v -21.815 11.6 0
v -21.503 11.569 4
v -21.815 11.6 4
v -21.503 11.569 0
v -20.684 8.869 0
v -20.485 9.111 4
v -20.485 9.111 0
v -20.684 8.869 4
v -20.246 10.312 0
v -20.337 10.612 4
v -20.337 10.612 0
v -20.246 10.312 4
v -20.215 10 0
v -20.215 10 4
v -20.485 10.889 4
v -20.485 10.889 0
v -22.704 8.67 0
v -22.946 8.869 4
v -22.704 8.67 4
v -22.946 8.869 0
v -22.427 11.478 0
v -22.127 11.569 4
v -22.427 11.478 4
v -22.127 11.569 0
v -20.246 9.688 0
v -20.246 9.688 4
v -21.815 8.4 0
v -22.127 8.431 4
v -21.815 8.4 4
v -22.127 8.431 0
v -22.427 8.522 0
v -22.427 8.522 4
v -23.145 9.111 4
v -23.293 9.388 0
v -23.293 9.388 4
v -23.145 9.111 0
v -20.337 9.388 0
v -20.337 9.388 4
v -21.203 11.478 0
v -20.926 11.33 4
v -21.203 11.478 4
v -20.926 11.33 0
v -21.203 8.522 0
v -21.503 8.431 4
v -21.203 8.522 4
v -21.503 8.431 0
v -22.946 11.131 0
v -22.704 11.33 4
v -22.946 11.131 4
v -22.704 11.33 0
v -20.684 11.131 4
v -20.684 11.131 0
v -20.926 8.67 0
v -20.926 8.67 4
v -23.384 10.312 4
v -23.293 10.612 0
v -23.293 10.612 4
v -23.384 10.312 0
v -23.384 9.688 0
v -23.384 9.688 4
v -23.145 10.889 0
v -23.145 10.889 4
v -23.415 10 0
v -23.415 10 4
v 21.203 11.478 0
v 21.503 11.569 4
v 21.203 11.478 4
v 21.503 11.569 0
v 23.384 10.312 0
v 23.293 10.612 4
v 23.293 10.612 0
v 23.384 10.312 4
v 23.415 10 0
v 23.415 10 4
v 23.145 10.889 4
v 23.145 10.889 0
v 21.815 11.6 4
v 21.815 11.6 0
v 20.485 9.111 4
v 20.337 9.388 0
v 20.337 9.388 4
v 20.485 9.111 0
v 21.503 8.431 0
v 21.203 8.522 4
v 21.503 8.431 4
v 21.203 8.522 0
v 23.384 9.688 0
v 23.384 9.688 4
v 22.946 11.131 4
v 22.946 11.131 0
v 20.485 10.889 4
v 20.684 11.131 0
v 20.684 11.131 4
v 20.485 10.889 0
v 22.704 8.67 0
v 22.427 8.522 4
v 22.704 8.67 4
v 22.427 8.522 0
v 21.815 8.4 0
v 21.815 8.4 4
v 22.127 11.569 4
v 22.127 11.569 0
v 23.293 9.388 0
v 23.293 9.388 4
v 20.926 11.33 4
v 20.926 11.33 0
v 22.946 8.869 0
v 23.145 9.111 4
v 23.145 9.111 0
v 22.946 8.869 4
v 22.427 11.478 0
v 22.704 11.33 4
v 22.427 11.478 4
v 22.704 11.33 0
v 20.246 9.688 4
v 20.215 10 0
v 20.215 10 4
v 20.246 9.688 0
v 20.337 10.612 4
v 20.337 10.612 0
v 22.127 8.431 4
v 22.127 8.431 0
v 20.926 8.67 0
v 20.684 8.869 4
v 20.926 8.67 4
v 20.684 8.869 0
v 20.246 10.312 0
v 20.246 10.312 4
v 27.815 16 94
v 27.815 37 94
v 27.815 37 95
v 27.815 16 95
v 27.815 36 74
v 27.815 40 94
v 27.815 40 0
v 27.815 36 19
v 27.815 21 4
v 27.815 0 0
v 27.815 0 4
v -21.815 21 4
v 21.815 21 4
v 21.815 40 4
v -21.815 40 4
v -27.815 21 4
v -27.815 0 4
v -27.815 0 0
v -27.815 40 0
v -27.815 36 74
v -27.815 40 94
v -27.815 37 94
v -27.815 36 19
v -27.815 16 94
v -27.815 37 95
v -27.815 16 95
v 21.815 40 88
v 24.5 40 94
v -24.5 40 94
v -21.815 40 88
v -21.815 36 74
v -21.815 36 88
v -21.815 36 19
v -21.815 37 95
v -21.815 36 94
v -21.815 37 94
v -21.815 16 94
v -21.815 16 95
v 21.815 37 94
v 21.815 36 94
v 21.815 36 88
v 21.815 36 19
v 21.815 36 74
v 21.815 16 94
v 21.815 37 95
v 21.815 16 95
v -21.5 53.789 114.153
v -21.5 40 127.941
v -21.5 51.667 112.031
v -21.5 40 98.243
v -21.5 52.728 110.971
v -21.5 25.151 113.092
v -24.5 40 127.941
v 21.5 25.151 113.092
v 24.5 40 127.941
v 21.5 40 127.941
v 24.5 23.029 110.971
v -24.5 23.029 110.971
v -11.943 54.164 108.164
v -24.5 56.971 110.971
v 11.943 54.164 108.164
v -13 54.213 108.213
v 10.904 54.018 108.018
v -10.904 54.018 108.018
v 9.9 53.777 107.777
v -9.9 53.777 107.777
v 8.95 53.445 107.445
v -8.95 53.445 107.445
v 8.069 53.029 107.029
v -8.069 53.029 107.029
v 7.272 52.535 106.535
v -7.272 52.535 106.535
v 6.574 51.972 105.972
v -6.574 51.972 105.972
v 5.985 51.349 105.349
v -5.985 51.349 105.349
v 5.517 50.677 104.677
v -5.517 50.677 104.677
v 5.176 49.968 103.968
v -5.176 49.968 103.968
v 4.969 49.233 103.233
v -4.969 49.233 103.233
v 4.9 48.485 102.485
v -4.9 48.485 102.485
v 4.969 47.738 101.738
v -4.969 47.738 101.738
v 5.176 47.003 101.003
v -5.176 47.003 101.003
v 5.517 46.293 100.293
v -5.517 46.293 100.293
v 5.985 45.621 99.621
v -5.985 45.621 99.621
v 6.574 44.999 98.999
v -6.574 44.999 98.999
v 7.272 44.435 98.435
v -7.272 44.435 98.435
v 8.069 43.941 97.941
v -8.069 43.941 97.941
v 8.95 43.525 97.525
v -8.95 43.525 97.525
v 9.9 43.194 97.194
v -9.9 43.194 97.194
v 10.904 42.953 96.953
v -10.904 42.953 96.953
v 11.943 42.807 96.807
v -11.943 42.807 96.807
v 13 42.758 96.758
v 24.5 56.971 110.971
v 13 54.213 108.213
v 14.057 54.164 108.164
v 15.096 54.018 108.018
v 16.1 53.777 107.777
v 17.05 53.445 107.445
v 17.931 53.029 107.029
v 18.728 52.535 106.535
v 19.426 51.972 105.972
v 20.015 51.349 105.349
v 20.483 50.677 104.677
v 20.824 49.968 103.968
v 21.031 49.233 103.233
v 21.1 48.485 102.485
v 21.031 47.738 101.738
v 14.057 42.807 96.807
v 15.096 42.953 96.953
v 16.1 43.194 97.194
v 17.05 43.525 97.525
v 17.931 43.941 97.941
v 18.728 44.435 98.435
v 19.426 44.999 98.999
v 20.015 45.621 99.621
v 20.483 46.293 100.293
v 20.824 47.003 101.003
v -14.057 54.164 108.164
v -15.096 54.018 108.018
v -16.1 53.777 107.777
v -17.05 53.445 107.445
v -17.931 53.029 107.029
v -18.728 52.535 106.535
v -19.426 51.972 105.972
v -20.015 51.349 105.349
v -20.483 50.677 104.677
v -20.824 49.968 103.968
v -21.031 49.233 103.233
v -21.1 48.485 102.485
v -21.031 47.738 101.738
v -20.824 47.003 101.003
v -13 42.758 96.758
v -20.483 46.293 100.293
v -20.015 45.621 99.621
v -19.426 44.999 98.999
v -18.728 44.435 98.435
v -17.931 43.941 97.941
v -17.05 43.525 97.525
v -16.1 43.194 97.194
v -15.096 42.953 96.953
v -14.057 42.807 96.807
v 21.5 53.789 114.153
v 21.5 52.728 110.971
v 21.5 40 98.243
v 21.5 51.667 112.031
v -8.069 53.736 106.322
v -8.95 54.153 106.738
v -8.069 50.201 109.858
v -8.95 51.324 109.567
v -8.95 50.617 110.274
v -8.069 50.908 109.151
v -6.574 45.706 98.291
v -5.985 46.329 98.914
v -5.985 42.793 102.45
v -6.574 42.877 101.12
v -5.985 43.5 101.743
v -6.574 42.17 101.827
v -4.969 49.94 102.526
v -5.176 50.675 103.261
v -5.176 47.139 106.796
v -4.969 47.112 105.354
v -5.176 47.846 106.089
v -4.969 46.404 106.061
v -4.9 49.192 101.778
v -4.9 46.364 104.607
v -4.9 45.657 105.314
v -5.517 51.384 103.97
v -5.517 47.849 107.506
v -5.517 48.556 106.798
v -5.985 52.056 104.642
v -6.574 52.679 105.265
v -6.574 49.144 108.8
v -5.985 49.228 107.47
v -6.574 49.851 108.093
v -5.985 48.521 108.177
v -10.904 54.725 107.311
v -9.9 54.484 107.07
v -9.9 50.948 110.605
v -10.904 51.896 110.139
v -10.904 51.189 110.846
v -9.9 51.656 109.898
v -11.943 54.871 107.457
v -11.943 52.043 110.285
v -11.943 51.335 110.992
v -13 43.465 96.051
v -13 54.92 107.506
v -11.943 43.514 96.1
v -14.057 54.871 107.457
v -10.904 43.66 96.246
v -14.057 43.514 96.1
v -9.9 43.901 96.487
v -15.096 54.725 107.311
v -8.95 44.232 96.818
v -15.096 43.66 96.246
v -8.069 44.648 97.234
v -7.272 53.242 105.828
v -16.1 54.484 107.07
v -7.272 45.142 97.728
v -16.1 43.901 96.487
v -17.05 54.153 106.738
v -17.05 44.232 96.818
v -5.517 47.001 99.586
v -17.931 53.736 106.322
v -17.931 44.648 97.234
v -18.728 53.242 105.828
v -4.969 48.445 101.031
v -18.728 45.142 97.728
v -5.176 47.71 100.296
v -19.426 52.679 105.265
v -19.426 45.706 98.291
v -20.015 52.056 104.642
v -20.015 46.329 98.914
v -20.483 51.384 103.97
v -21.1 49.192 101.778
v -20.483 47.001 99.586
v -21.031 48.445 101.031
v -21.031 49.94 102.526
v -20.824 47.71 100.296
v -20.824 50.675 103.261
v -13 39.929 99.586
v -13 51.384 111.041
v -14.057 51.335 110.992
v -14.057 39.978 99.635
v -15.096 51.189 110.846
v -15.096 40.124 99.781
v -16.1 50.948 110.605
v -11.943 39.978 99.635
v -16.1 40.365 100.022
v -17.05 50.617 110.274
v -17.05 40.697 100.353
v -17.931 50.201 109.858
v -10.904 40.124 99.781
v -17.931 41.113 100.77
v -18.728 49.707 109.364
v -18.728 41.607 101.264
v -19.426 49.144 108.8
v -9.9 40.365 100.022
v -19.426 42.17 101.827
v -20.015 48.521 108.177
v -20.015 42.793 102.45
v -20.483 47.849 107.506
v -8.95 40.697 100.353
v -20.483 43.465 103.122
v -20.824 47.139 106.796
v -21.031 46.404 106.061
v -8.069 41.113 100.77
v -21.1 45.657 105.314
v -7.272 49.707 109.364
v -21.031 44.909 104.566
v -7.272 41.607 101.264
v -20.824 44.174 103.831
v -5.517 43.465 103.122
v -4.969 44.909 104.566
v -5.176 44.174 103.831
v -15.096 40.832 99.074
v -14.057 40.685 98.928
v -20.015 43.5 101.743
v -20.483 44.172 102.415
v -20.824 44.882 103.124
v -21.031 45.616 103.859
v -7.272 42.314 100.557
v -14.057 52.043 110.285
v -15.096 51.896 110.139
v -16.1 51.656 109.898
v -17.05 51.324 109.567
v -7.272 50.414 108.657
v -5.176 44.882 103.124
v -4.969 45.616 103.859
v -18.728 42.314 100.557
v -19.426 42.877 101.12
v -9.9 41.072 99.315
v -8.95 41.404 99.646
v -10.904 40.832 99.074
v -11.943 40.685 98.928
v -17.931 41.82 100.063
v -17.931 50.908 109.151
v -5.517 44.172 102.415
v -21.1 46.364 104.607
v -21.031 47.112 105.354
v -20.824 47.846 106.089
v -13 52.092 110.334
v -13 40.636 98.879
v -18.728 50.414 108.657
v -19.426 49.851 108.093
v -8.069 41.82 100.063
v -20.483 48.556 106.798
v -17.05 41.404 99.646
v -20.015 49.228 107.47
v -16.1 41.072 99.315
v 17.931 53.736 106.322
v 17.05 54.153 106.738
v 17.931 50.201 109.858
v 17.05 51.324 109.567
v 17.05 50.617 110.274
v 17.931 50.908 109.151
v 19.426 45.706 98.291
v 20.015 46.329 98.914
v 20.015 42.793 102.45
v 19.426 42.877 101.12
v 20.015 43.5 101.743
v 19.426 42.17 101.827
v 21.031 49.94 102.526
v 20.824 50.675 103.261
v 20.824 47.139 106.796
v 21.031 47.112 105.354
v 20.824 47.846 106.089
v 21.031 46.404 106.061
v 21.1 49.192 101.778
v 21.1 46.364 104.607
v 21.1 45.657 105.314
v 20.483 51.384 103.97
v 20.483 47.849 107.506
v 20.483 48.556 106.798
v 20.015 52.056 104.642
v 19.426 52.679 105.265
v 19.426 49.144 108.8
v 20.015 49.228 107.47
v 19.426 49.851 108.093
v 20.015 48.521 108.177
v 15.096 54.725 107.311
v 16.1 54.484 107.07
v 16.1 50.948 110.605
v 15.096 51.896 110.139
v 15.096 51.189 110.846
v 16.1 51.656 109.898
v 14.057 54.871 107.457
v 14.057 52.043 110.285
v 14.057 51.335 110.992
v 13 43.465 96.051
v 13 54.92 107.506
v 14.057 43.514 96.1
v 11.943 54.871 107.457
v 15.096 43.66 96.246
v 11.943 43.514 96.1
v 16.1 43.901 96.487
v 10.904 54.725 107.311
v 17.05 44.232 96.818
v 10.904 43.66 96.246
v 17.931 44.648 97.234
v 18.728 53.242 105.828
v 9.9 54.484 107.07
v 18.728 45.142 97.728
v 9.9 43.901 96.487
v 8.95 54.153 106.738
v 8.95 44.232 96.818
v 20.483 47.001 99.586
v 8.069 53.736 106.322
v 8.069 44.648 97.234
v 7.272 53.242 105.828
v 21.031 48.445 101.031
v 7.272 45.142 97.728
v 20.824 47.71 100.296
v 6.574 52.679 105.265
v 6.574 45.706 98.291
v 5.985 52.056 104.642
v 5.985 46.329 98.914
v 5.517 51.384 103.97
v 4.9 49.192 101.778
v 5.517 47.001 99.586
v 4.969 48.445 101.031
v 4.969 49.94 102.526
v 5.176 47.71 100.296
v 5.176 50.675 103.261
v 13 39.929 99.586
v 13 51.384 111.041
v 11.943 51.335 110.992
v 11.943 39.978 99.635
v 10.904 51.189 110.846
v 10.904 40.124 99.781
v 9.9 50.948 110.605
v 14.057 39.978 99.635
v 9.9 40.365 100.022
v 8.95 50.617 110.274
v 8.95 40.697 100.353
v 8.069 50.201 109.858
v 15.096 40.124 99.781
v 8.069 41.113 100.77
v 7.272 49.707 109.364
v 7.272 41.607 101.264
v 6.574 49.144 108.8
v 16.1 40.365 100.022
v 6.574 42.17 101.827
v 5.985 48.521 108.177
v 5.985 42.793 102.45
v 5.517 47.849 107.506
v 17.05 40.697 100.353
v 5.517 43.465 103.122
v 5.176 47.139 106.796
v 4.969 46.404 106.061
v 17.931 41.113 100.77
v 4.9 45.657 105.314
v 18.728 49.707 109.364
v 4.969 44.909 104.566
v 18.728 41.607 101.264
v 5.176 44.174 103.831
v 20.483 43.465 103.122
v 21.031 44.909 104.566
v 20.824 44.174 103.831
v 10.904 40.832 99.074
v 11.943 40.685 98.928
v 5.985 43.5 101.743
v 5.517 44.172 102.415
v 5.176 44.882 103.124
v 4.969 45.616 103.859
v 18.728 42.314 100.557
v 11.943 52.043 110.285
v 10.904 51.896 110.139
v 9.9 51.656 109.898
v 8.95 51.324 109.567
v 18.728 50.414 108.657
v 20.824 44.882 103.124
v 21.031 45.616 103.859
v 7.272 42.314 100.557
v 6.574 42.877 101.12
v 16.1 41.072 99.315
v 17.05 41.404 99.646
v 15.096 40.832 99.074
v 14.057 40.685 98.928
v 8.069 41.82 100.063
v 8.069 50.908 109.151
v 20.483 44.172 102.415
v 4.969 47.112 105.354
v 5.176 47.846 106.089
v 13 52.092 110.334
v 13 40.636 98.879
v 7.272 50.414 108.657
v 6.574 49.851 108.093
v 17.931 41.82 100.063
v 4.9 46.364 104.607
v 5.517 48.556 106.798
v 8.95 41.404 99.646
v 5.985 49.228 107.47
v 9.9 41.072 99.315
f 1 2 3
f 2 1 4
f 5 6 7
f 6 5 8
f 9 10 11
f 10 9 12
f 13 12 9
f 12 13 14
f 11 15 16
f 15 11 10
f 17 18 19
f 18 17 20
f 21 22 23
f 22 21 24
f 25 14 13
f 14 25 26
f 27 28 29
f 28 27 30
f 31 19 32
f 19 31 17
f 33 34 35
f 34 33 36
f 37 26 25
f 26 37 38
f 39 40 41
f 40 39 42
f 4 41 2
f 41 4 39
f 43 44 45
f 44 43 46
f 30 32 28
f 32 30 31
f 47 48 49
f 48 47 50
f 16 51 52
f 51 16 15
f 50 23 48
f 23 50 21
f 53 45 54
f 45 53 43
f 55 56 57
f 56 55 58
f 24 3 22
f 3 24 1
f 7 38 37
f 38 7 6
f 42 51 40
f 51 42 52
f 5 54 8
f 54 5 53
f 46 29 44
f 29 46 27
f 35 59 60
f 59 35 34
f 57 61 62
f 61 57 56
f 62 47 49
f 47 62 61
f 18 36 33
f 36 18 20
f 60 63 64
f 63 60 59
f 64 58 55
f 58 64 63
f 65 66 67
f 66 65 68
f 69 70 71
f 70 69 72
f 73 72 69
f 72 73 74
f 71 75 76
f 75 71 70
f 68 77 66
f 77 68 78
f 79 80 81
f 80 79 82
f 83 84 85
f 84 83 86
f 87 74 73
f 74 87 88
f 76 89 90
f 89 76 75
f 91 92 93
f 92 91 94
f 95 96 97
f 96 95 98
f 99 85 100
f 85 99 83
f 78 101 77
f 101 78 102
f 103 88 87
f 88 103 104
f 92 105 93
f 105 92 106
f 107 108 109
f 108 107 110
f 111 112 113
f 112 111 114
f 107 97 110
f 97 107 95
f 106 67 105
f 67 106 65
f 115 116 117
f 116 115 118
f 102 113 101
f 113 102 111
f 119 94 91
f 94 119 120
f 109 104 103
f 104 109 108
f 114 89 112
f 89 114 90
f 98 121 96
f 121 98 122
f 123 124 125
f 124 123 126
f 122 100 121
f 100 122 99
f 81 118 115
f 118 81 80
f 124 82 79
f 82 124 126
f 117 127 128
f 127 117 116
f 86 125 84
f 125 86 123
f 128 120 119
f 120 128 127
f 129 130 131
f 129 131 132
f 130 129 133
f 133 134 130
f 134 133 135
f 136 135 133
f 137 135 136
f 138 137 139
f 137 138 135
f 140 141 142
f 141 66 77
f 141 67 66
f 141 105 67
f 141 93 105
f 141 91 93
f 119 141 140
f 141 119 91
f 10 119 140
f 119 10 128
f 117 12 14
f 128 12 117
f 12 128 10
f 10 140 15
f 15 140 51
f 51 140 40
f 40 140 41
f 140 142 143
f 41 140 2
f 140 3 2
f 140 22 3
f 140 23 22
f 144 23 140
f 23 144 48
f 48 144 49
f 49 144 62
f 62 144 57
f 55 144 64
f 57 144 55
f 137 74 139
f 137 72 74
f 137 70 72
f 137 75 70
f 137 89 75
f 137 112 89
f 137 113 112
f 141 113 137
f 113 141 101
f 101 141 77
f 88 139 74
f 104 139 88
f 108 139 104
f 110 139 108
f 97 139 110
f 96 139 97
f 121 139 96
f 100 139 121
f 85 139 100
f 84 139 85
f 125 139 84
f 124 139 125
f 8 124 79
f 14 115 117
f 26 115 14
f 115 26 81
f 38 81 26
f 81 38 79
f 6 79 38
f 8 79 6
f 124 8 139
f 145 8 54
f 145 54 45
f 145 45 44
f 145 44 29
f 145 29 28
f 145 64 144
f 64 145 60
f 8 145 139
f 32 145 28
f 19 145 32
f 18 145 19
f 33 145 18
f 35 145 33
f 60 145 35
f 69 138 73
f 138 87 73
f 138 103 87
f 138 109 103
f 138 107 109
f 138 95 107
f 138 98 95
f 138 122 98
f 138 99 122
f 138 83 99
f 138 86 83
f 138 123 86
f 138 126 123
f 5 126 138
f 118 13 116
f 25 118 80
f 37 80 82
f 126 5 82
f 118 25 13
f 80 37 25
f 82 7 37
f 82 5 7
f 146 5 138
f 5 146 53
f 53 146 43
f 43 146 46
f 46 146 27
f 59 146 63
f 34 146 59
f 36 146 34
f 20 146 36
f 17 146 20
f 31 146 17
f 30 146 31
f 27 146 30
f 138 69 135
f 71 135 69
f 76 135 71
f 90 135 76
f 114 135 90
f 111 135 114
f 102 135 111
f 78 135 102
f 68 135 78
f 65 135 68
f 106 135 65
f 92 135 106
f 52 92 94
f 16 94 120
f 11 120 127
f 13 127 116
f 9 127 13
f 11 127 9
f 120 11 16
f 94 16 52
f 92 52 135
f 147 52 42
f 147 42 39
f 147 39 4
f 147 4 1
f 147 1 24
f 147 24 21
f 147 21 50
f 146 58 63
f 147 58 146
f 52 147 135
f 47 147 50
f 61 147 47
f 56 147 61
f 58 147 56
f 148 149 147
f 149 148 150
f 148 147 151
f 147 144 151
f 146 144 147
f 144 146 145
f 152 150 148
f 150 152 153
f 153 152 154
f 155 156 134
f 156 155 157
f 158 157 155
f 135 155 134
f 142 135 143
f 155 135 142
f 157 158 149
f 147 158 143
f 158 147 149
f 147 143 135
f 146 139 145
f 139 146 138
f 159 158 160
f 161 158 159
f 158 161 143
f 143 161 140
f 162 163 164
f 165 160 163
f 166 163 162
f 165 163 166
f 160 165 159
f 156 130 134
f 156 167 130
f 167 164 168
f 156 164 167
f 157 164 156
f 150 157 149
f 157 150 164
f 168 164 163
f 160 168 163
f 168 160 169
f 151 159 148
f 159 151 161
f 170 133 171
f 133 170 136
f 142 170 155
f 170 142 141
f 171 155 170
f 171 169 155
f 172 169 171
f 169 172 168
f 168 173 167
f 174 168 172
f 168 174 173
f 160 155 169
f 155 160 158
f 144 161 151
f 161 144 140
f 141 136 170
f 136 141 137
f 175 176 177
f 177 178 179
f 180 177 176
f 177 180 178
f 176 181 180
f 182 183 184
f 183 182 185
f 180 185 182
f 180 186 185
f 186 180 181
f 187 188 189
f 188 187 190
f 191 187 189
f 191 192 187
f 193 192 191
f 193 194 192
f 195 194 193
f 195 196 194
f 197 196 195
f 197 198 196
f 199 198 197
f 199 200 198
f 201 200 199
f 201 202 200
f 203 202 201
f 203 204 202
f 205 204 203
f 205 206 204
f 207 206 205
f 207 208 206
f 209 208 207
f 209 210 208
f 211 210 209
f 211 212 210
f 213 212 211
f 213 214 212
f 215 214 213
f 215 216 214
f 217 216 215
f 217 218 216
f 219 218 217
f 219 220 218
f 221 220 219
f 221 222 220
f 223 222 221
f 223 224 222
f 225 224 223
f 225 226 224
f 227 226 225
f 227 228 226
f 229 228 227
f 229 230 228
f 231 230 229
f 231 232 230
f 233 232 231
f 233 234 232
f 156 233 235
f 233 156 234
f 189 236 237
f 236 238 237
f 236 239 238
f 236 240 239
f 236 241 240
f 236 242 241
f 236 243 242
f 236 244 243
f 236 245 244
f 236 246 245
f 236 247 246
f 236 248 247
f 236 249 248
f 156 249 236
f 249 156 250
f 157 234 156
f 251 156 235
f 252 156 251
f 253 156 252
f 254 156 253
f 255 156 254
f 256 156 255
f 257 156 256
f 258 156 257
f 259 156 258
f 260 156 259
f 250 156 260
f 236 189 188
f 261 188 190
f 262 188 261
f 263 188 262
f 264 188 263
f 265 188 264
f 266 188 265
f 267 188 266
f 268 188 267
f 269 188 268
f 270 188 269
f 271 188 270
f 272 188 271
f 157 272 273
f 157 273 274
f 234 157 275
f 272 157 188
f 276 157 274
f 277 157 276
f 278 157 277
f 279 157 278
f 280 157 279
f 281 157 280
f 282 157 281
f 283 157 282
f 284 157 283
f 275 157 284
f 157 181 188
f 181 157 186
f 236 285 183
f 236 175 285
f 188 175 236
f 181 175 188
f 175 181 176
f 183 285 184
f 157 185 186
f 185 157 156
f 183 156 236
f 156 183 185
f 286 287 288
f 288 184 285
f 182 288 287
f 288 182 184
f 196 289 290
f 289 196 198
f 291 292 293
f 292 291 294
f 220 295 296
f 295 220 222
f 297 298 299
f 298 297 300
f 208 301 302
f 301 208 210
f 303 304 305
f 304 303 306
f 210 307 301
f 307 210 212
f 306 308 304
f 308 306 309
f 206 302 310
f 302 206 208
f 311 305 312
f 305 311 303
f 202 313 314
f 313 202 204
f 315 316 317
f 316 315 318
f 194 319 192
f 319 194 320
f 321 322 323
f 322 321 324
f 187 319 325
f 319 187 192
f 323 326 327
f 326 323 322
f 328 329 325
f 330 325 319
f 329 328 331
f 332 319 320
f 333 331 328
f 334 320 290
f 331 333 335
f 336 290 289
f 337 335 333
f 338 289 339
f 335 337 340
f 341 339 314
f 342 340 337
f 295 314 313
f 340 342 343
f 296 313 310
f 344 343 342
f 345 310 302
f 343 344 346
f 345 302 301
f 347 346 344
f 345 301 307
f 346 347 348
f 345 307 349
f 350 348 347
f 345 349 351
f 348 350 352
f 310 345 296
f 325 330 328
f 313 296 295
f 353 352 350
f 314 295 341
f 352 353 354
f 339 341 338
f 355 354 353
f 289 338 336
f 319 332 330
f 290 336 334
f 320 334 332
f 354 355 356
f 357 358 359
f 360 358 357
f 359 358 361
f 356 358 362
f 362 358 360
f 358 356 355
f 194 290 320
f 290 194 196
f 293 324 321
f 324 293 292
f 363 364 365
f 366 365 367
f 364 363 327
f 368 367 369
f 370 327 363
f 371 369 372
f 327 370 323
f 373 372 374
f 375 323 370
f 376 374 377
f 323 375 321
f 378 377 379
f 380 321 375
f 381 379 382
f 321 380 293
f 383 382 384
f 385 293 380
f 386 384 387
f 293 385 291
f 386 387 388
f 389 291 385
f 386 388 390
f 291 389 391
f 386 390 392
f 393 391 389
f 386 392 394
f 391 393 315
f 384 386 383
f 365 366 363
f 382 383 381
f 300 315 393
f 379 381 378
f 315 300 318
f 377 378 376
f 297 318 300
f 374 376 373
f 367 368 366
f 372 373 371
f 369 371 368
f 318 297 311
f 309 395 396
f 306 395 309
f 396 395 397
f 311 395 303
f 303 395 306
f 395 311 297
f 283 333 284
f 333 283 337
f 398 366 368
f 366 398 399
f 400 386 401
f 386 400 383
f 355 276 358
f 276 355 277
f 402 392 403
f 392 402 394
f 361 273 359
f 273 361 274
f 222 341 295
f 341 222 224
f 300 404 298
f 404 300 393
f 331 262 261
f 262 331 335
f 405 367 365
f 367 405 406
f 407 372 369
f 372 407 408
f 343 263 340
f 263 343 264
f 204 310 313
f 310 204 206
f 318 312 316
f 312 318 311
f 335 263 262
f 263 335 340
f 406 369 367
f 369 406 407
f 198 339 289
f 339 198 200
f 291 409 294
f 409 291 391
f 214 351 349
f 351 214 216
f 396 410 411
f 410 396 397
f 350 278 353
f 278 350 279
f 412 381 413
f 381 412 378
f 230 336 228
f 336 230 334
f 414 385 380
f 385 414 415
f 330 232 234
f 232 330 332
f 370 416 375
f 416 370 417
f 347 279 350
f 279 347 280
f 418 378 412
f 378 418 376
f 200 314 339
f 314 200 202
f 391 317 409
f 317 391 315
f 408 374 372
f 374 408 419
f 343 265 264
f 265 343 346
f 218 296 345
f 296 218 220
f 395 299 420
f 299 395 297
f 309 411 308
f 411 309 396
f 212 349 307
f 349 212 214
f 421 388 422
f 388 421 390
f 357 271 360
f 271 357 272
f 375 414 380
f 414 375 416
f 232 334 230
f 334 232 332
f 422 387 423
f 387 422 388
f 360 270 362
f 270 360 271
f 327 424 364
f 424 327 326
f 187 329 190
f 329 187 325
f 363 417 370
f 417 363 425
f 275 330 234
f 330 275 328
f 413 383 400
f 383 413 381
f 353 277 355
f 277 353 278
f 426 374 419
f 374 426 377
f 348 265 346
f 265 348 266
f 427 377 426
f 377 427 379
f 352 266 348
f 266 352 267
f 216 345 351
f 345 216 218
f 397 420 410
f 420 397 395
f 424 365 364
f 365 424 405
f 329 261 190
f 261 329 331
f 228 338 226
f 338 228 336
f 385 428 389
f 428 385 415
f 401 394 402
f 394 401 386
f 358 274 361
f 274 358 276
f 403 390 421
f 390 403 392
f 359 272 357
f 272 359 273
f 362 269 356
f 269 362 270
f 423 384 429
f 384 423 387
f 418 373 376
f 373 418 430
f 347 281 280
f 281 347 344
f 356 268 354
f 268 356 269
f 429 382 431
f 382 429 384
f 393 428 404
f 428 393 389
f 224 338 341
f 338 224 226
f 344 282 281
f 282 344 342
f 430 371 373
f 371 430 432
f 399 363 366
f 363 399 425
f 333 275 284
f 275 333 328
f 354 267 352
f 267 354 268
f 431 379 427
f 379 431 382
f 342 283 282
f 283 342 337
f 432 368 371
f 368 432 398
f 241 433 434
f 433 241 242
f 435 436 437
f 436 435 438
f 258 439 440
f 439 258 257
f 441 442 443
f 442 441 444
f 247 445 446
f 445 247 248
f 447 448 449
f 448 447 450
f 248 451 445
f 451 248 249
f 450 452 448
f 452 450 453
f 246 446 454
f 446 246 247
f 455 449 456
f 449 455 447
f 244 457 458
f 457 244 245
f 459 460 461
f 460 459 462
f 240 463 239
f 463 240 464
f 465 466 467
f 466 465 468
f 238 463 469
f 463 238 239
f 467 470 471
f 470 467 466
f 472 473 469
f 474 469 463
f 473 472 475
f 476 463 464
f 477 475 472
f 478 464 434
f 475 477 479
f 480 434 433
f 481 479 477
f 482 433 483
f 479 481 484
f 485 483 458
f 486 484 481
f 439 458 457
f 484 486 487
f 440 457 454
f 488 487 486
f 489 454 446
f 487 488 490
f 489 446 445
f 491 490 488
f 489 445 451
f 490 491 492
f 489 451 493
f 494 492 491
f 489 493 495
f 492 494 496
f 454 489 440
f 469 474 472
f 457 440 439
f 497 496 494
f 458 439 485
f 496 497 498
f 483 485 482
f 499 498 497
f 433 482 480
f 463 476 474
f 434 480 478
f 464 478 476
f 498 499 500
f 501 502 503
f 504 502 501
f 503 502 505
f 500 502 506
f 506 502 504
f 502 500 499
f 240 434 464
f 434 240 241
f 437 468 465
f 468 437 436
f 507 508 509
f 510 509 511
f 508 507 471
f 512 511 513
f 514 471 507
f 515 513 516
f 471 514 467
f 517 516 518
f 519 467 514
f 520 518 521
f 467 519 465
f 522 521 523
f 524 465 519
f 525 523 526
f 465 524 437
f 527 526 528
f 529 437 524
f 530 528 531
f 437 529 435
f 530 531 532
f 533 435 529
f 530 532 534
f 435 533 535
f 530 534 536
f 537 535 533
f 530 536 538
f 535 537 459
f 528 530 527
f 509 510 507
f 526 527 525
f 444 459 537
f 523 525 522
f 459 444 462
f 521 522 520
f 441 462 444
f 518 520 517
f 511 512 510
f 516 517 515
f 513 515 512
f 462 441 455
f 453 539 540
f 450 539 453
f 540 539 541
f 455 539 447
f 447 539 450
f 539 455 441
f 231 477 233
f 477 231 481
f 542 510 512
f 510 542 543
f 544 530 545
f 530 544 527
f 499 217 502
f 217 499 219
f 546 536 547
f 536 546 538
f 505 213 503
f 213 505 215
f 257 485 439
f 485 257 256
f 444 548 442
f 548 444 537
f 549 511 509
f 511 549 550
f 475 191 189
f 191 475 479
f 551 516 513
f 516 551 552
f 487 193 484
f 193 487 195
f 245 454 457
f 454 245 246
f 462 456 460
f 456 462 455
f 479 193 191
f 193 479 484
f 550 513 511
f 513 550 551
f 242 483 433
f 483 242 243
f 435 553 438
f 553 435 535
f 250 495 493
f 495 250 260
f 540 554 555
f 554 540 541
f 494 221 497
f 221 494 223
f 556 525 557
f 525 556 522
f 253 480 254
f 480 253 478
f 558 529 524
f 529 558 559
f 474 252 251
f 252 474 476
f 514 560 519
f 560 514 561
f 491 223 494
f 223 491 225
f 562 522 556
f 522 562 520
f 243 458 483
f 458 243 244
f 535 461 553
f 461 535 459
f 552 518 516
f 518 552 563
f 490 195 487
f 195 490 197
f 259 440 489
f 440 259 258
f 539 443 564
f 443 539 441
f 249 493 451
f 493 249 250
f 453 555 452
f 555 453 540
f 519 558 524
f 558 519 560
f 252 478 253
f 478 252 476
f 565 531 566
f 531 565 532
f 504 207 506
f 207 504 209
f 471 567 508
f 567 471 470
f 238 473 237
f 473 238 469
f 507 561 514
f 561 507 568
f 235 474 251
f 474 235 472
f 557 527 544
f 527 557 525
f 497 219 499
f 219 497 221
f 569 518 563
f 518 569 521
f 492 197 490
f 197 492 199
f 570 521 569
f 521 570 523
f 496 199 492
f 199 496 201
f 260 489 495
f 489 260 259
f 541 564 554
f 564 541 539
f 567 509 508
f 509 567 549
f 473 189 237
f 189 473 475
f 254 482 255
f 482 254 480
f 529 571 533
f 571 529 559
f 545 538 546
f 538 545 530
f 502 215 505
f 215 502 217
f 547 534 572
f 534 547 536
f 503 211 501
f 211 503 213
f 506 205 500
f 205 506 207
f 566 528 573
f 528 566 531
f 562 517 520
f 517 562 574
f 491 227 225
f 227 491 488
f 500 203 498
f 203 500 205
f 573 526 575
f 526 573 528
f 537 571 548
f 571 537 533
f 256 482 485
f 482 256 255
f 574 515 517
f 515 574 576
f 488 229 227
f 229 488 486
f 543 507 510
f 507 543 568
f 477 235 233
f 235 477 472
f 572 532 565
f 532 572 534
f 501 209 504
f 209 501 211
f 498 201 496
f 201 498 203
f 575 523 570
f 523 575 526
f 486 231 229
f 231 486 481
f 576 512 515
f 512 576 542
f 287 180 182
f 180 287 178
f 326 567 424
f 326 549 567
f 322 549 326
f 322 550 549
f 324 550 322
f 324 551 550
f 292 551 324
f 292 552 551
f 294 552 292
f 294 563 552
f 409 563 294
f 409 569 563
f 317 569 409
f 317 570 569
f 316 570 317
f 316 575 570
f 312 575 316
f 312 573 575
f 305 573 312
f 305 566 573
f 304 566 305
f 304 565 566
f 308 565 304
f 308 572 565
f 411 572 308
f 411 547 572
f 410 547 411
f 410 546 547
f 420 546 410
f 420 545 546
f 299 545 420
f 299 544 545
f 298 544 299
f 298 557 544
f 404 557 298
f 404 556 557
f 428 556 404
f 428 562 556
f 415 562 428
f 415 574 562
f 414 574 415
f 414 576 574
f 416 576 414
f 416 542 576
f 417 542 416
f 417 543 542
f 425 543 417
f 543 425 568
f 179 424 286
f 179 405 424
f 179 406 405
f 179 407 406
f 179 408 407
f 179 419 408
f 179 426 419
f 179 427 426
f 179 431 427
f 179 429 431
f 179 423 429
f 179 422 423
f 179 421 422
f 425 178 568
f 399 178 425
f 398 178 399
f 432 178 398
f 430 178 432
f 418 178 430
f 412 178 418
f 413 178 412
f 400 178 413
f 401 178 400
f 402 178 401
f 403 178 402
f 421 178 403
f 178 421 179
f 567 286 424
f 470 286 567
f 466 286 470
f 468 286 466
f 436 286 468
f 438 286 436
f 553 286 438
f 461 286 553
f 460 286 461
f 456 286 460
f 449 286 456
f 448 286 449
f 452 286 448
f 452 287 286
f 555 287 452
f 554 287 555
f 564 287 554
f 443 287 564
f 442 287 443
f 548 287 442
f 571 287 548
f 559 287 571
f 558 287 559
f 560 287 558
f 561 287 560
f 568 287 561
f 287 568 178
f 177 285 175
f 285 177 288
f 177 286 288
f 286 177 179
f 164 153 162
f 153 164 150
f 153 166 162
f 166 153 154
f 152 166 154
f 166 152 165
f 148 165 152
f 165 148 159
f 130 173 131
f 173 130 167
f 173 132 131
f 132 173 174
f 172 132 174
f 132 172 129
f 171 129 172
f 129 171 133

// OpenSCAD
// Ultrasonic Sensor (HC-SR04) Mount for Freenove 4WD Car
// Angled 45° downward for table edge detection

/* --- Parameters --- */

// Chassis mounting
hole_spacing    = 43.63;   // center-to-center M3 holes
hole_diameter   = 3.2;     // M3 clearance
base_depth      = 40;      // holes to front + overhang
base_width      = hole_spacing + 12; // padding around holes
base_thick      = 4;

// Riser
riser_height    = 90;
riser_width     = base_width;
riser_thick     = 4;

// HC-SR04 sensor
sensor_board_w  = 45;
sensor_board_h  = 20;
sensor_board_t  = 1.5;
sensor_can_d    = 16.2;    // transducer diameter + tolerance
sensor_can_spacing = 26;   // center-to-center of transducers
sensor_lip      = 1.5;     // lip to hold board in place

// Cradle
cradle_angle    = 45;
cradle_thick    = 3;
cradle_depth    = sensor_board_h + 4;

// Fillets/reinforcement
gusset_size     = 15;

/* --- Modules --- */

module base_plate() {
    difference() {
        // plate
        translate([-base_width/2, 0, 0])
            cube([base_width, base_depth, base_thick]);
        
        // M3 mounting holes
        for (x = [-hole_spacing/2, hole_spacing/2]) {
            translate([x, 10, -1])
                cylinder(h = base_thick + 2, d = hole_diameter, $fn = 32);
        }
    }
}

// Replace the solid riser with two posts + crossbar
post_width = 6;

module riser() {
    for (x = [-riser_width/2, riser_width/2 - post_width]) {
        translate([x, base_depth - riser_thick, base_thick])
            cube([post_width, riser_thick, riser_height]);
    }
    // crossbar at top
    translate([-riser_width/2, base_depth - riser_thick, base_thick + riser_height - post_width])
        cube([riser_width, riser_thick, post_width]);
}

module gusset() {
    for (x = [-riser_width/2, riser_width/2 - post_width]) {
        translate([x, base_depth - riser_thick - gusset_size, base_thick])
            rotate([0, 90, 0])
                linear_extrude(height = post_width)
                    polygon([
                        [0, 0],
                        [0, gusset_size],
                        [-gusset_size, gusset_size]
                    ]);
    }
}

module sensor_cradle() {
    translate([0, base_depth, base_thick + riser_height])
    rotate([cradle_angle, 0, 0])
    translate([-sensor_board_w/2 - 2, 0, 0]) {
        cradle_w = sensor_board_w + 4;
        
        // back wall
        cube([cradle_w, cradle_thick, sensor_board_h + 4]);
        
        // bottom lip
        cube([cradle_w, cradle_depth, cradle_thick]);
        
        // side walls
        for (x = [0, cradle_w - cradle_thick]) {
            translate([x, 0, 0])
                cube([cradle_thick, cradle_depth, sensor_board_h + 4]);
        }
        
        // front lip (shorter, to slide sensor in)
        translate([0, cradle_depth - cradle_thick, 0])
            cube([cradle_w, cradle_thick, sensor_lip + cradle_thick]);
        
        // cutouts for transducer cans (so they poke through bottom)
        translate([0, 0, -1]) {
            for (i = [-1, 1]) {
                translate([cradle_w/2 + i * sensor_can_spacing/2, cradle_depth/2, 0])
                    cylinder(h = cradle_thick + 2, d = sensor_can_d, $fn = 48);
            }
        }
    }
}

module cradle_support() {
    s = 20;
    for (x = [-riser_width/2, riser_width/2 - post_width]) {
        hull() {
            // top of post
            translate([x, base_depth - riser_thick, base_thick + riser_height])
                cube([post_width, 1, 1]);
            // same height, behind
            translate([x, base_depth - riser_thick - s, base_thick + riser_height])
                cube([post_width, 1, 1]);
            // down the post, flush with riser
            translate([x, base_depth - riser_thick, base_thick + riser_height - s])
                cube([post_width, 1, 1]);
        }
    }
}

/* --- Assembly --- */

module mount() {
    color("DodgerBlue") base_plate();
    color("SteelBlue") riser();
    color("SteelBlue") gusset();
    color("CornflowerBlue") sensor_cradle();
    cradle_support();
}

mount();
